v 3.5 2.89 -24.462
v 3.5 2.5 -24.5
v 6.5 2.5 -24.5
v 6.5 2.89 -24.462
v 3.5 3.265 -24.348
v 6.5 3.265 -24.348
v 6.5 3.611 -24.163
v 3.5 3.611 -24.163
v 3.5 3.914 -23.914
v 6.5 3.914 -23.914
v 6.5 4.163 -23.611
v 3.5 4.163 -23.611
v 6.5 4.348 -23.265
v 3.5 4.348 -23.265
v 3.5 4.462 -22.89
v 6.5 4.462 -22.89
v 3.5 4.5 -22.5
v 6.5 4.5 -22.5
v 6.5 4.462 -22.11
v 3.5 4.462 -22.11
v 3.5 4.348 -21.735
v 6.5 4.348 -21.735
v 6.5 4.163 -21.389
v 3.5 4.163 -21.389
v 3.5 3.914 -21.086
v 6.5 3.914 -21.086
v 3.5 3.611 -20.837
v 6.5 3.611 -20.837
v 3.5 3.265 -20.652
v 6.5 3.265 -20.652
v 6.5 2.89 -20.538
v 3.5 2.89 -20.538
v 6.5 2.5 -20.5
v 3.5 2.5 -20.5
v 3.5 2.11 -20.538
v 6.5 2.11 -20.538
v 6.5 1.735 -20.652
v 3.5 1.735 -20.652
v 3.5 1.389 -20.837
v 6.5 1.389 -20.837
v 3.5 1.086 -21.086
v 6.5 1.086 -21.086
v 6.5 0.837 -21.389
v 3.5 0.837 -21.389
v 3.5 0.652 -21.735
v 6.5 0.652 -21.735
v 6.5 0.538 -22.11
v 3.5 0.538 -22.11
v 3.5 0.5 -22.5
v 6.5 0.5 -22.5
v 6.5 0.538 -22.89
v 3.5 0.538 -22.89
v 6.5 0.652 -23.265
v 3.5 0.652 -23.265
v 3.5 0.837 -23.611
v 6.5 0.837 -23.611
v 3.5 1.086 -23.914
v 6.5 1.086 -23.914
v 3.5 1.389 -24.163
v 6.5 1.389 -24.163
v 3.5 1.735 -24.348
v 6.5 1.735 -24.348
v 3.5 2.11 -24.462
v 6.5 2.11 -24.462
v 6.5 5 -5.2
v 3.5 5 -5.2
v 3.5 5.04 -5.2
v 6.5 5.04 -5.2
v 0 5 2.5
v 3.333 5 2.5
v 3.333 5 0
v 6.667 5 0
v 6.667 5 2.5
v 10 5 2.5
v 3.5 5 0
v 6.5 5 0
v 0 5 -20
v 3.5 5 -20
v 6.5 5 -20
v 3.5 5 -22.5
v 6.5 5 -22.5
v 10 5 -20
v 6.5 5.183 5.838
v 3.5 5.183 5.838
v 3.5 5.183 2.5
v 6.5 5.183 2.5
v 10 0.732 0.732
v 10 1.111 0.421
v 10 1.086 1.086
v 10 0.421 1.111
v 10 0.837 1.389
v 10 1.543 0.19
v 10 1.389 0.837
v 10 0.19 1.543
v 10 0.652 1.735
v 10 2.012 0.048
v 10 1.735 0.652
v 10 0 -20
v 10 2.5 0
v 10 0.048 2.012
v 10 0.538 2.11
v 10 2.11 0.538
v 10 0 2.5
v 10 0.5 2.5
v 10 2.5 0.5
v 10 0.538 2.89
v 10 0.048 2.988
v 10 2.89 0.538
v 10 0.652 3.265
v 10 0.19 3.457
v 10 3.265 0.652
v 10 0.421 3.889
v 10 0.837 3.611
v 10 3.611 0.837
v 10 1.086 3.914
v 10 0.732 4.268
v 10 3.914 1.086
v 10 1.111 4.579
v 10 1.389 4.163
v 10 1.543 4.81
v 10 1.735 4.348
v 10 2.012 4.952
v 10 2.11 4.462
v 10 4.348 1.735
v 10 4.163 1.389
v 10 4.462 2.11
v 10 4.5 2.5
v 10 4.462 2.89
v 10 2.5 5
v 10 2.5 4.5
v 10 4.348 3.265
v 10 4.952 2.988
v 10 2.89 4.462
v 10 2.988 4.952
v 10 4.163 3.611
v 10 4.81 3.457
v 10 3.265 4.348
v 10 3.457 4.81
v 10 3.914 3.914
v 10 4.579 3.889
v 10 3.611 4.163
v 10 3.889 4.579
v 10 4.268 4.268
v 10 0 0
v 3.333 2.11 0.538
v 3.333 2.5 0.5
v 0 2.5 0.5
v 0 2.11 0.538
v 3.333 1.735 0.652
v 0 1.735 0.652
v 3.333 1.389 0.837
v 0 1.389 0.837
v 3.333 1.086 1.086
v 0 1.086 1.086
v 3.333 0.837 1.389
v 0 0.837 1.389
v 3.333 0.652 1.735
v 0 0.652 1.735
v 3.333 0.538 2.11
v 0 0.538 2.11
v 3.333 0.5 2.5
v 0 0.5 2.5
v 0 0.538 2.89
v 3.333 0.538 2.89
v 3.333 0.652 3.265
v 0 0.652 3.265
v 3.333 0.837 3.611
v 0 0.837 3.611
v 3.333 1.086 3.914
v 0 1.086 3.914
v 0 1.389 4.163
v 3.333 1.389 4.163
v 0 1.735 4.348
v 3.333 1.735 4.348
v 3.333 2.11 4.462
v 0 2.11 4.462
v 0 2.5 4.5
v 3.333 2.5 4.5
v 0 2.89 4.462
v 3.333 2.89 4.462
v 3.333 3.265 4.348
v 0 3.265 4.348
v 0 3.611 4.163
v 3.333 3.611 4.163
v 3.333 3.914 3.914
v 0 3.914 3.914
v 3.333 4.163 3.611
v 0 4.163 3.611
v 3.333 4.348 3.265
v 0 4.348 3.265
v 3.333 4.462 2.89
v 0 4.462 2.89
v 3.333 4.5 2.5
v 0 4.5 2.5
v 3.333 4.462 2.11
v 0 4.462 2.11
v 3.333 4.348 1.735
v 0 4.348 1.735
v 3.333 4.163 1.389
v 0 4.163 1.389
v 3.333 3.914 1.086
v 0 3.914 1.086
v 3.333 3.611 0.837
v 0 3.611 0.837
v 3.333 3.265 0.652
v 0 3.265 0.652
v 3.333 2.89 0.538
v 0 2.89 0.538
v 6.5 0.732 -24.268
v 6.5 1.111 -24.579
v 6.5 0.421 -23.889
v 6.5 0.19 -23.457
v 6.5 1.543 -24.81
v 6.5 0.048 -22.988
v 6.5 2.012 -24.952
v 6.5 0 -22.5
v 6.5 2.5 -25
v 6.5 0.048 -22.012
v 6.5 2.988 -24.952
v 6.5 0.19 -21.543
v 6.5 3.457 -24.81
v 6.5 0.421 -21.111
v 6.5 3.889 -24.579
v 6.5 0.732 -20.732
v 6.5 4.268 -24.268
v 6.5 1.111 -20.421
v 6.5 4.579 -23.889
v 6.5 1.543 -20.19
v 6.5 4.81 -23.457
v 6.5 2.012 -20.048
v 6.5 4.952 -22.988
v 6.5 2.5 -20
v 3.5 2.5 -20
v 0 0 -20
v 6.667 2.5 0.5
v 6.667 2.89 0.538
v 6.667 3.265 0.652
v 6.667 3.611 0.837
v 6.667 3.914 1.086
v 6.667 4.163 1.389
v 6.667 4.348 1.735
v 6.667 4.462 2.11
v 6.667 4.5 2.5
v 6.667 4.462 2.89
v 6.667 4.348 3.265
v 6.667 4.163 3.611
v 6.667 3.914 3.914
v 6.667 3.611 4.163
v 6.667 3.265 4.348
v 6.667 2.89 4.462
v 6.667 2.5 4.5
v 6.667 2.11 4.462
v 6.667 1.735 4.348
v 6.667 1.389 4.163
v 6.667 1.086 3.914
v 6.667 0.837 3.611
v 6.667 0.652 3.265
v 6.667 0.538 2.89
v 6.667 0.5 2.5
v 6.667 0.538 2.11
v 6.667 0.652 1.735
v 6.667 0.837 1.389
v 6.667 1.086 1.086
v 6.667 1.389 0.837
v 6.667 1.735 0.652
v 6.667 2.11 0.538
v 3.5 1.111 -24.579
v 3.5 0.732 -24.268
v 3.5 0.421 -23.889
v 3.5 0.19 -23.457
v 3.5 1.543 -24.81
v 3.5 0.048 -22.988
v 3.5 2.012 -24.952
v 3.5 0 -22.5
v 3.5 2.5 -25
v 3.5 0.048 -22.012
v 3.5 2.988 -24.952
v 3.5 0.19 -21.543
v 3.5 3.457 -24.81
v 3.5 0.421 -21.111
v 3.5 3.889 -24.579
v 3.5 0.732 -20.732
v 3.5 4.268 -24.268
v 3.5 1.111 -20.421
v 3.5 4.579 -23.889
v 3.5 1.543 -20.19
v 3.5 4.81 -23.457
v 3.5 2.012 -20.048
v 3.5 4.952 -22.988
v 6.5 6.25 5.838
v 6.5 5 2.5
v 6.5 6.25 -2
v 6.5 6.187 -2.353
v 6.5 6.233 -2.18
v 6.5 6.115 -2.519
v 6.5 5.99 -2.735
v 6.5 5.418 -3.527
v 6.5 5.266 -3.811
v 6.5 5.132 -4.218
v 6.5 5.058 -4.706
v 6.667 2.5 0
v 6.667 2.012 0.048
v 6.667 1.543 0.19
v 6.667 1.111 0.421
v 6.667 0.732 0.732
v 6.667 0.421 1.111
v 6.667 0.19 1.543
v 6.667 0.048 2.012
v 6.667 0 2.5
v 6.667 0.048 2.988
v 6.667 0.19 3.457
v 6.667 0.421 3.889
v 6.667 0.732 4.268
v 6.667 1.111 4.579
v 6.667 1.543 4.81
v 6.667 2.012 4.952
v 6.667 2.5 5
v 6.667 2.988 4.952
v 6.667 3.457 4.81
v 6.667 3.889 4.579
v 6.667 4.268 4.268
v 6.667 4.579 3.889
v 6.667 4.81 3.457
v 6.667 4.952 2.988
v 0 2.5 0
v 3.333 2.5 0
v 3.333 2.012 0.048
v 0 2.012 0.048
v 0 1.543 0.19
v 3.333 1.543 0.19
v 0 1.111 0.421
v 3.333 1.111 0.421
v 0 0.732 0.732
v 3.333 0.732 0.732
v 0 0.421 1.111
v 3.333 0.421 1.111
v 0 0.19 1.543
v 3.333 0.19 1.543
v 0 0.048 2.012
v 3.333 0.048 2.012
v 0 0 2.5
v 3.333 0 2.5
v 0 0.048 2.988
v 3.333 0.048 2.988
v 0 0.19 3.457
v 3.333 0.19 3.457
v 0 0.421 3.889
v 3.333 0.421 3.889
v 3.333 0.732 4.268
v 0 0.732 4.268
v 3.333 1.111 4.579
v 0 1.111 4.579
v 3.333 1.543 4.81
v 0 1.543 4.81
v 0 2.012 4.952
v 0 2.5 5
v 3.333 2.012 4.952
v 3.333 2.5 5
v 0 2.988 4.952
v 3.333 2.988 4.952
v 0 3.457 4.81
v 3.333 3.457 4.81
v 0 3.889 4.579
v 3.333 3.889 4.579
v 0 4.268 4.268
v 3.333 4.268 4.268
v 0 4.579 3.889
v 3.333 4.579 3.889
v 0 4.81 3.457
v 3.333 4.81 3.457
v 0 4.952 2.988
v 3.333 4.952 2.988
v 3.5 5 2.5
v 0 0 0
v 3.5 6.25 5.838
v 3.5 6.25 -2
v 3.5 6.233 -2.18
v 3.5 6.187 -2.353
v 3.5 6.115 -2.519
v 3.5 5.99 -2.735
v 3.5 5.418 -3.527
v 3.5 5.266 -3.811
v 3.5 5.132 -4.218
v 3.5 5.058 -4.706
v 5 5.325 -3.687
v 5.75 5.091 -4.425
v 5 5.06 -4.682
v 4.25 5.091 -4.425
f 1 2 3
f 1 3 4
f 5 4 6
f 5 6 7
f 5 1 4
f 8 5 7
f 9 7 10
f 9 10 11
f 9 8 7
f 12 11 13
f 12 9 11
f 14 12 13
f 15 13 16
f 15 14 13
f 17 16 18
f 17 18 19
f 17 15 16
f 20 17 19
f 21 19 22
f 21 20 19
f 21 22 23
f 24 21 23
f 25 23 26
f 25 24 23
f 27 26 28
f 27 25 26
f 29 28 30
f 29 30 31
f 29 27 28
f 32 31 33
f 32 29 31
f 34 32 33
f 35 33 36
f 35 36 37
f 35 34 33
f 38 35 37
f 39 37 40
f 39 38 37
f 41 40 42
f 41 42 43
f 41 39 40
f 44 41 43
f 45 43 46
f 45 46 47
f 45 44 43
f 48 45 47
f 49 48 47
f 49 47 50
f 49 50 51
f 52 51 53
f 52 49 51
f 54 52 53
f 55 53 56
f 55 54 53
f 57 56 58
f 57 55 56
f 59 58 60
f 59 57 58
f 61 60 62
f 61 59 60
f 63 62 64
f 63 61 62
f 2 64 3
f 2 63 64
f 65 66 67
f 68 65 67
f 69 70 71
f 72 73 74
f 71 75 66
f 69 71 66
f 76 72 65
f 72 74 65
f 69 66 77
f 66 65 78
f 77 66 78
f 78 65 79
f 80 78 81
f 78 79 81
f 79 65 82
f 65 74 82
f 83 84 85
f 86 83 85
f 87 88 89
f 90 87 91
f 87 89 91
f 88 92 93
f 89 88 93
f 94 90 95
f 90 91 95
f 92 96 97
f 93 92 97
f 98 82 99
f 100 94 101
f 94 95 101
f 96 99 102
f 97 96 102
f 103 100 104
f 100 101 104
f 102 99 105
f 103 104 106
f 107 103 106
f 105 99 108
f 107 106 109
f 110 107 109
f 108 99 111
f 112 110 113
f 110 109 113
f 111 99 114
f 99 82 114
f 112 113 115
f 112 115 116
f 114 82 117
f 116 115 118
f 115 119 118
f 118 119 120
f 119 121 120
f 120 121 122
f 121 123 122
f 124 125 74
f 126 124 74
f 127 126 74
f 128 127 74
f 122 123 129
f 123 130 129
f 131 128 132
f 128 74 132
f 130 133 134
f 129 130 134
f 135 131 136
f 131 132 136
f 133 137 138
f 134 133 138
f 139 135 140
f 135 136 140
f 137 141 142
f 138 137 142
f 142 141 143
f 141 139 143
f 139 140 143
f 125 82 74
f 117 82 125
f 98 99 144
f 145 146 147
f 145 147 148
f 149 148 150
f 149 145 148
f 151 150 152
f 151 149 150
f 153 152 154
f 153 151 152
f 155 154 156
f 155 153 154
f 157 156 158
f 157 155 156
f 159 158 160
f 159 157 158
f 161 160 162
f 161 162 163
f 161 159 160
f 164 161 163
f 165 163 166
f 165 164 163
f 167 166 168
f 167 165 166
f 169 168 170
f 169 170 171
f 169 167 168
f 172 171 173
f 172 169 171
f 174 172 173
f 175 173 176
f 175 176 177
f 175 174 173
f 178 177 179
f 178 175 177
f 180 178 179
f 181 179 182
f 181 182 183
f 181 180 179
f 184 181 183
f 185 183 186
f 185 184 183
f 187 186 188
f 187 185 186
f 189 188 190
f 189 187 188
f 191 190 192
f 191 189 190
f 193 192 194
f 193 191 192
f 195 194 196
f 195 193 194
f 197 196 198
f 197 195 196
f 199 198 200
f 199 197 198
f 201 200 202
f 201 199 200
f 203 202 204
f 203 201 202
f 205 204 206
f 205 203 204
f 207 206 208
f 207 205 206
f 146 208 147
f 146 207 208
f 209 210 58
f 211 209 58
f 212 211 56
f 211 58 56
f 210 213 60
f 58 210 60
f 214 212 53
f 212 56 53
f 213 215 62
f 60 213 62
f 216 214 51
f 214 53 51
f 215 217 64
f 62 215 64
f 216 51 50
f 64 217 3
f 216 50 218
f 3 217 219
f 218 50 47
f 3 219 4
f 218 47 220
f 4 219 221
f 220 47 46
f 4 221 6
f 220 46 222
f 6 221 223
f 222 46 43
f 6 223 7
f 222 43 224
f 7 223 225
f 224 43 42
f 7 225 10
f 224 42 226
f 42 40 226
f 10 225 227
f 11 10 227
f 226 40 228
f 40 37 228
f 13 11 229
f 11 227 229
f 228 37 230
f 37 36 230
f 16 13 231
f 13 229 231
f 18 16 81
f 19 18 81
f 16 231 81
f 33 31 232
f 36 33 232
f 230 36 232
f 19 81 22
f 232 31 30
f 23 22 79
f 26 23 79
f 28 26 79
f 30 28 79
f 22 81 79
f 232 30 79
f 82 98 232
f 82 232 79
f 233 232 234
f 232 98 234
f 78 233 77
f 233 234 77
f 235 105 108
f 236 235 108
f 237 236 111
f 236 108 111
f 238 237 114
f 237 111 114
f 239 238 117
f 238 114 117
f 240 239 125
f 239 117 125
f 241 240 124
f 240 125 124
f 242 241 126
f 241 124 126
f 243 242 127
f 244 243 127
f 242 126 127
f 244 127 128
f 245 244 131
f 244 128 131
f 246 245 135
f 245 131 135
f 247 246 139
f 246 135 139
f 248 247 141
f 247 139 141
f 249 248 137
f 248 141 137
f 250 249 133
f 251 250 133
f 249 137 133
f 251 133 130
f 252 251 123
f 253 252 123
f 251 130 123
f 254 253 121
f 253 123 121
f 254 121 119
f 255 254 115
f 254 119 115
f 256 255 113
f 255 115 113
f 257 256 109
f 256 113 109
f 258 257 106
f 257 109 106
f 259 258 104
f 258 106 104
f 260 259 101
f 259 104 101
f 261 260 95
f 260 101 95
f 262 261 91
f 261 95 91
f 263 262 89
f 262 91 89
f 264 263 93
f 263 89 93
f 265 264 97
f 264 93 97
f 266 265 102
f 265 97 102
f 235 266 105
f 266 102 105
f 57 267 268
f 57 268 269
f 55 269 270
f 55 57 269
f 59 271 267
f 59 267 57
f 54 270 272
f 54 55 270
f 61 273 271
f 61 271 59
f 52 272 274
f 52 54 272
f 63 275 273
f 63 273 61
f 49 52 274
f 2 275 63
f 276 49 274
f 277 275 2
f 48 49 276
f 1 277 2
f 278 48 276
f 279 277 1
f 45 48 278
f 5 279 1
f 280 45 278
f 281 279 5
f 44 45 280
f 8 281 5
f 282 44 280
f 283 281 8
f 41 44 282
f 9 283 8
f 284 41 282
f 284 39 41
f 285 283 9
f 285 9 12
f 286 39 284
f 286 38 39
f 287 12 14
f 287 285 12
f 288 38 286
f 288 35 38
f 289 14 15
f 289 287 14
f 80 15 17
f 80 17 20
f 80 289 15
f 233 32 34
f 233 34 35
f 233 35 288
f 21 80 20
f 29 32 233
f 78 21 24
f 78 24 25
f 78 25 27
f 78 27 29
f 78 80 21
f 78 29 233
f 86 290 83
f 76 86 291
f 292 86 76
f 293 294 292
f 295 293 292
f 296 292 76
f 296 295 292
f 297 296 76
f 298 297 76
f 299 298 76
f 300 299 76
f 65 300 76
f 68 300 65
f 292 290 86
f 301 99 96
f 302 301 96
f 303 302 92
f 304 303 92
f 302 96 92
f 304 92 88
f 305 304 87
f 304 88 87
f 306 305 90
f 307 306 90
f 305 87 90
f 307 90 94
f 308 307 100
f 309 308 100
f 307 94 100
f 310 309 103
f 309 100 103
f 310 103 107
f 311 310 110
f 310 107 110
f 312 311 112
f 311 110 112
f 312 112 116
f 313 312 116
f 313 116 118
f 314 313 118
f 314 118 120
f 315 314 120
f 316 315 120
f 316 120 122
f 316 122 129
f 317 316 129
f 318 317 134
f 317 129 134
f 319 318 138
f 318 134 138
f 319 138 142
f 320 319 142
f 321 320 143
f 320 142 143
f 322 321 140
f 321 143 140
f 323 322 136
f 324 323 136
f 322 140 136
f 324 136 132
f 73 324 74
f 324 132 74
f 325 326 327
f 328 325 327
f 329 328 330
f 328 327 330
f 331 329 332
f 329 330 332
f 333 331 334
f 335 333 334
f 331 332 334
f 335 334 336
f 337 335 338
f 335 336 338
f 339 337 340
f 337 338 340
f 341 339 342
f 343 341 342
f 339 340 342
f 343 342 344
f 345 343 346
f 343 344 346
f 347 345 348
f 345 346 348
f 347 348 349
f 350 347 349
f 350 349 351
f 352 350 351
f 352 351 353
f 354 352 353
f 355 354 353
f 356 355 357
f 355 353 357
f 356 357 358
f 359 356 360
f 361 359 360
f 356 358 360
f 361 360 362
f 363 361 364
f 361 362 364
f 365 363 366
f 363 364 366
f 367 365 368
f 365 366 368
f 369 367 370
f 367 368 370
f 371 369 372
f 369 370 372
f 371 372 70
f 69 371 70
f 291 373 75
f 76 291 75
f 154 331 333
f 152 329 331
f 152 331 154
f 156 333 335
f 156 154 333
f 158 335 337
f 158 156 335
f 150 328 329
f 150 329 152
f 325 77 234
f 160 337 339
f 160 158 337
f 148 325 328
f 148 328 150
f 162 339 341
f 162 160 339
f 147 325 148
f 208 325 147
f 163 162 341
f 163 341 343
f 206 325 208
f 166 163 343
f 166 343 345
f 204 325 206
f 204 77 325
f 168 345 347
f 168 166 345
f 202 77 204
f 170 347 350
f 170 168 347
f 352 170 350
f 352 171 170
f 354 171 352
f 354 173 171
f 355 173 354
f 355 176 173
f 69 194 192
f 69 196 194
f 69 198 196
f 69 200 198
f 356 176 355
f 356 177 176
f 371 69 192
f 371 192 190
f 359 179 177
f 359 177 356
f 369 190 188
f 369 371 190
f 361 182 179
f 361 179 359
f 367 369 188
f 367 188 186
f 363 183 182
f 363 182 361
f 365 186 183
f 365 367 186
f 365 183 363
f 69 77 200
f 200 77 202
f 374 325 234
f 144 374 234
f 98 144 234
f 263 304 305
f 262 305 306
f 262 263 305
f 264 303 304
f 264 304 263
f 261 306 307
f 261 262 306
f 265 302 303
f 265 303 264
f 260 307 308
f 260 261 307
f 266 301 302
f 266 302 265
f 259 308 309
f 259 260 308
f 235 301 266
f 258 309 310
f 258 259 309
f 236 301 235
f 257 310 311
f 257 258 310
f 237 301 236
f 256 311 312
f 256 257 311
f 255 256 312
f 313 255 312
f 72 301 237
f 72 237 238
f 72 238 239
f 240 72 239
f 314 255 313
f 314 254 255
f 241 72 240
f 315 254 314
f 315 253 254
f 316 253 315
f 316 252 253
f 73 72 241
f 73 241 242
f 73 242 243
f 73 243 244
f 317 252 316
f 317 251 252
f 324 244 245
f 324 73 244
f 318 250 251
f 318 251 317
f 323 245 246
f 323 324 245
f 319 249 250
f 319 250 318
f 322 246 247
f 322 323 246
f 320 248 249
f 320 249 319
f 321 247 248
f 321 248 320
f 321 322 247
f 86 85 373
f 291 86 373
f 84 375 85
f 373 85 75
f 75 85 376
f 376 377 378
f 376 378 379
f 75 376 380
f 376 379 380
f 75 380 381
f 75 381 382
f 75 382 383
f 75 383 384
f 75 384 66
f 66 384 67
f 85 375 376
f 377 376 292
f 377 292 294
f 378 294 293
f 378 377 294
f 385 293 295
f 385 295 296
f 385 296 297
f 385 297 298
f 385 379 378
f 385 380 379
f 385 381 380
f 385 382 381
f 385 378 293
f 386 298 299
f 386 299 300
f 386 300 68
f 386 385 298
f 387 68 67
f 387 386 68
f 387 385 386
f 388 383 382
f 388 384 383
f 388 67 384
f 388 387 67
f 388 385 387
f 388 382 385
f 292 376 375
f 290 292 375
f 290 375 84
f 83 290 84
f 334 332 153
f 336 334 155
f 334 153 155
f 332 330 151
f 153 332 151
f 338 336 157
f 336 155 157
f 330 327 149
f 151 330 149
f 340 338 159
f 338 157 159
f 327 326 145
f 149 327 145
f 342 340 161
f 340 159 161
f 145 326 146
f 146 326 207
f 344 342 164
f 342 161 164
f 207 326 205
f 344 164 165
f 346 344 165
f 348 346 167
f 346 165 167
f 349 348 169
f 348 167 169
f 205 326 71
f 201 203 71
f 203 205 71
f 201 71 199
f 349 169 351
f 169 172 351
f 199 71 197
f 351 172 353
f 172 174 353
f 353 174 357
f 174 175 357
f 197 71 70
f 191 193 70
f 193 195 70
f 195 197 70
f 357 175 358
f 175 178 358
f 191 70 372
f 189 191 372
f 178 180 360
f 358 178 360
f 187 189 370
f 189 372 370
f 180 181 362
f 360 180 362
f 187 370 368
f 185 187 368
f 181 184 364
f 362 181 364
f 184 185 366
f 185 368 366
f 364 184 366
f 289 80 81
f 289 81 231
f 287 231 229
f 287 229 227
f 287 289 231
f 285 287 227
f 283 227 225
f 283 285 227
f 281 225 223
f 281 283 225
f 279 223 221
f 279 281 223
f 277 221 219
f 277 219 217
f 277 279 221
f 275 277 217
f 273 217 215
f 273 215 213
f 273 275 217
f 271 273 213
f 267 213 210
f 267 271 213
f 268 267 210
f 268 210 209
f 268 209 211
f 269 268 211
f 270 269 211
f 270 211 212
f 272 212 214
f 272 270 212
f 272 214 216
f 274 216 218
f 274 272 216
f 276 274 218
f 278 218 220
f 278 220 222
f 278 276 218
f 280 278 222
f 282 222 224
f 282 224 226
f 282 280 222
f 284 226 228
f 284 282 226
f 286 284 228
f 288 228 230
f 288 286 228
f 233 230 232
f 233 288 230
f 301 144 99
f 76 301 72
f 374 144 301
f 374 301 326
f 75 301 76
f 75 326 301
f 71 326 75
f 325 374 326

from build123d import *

# Parameters (mm, degrees)
SKETCH2_W                = 20
SKETCH2_H                = 5
BOSS_EXTRUDE1_DEPTH      = 10
SKETCH4_R                = 2
BOSS_EXTRUDE2_DEPTH      = 3.333333333
BOSS_EXTRUDE3_START      = -3.333333333
SKETCH5_R                = 2
BOSS_EXTRUDE3_DEPTH      = 3.333333333
BOSS_EXTRUDE4_DEPTH      = 1.5
BOSS_EXTRUDE4_DEPTH_BACK = 1.5
SKETCH7_R                = 2
BOSS_EXTRUDE5_DEPTH      = 1.5
BOSS_EXTRUDE5_DEPTH_BACK = 1.5
CUT_EXTRUDE1_DEPTH       = 27.57654043


with BuildPart() as part:
    # Sketch2 → Boss-Extrude1 (new body)
    with BuildSketch(Plane(origin=(0, 0, 0), x_dir=(0, 0, -1), z_dir=(1, 0, 0))):
        with Locations((10, 2.5)):
            Rectangle(SKETCH2_W, SKETCH2_H)
    extrude(amount=BOSS_EXTRUDE1_DEPTH)

    # Sketch4 → Boss-Extrude2 (add)
    with BuildSketch(Plane(origin=(10, 0, 0), x_dir=(0, 0, -1), z_dir=(1, 0, 0))):
        with BuildLine():
            Line((-2.5, 5), (0, 5))
            Line((0, 5), (0, 2.5))
            ThreePointArc((0, 2.5), (-4.267766953, 0.732233047), (-2.5, 5))
        make_face()
        with Locations((-2.5, 2.5)):
            Circle(SKETCH4_R, mode=Mode.SUBTRACT)
    extrude(amount=-BOSS_EXTRUDE2_DEPTH)

    # Sketch5 → Boss-Extrude3 (add)
    with BuildSketch(Plane.ZY.offset(BOSS_EXTRUDE3_START)):
        with BuildLine():
            Line((2.5, 5), (0, 5))
            Line((0, 5), (0, 2.5))
            ThreePointArc((0, 2.5), (4.267766953, 0.732233047), (2.5, 5))
        make_face()
        with Locations(Location((2.5, 2.5, 0), (0, 0, 180))):
            Circle(SKETCH5_R, mode=Mode.SUBTRACT)
    extrude(amount=BOSS_EXTRUDE3_DEPTH)

    # Sketch7 → Boss-Extrude4 (add, two sides: drawn at the far end of the back side and taken through both)
    with BuildSketch(Plane(origin=(5, 0, 0), x_dir=(0, 0, -1), z_dir=(1, 0, 0)).offset(-BOSS_EXTRUDE4_DEPTH_BACK)):
        with BuildLine():
            Line((20, 5), (22.5, 5))
            ThreePointArc((22.5, 5), (24.267766953, 0.732233047), (20, 2.5))
            Line((20, 2.5), (20, 5))
        make_face()
        with Locations((22.5, 2.5)):
            Circle(SKETCH7_R, mode=Mode.SUBTRACT)
    extrude(amount=BOSS_EXTRUDE4_DEPTH + BOSS_EXTRUDE4_DEPTH_BACK)

    # Sketch8 → Boss-Extrude5 (add, two sides: drawn at the far end of the back side and taken through both)
    with BuildSketch(Plane(origin=(5, 0, 0), x_dir=(0, 0, -1), z_dir=(1, 0, 0)).offset(-BOSS_EXTRUDE5_DEPTH_BACK)):
        with BuildLine():
            Line((0, 5), (2, 5))
            Line((2, 5), (5.2, 5))
            Line((5.2, 5), (5.2, 5.04))
            add(Edge.make_bspline(
                [(2, 6.25), (2.633677282, 6.25), (3.485069852, 5.13334343), (4.685132782, 5.04), (5.2, 5.04)],
                knots=[0, 0, 0, 0, 0.555540961, 1, 1, 1, 1], degree=3))
            Line((2, 6.25), (-8, 6.25))
            Line((-8, 6.25), (-8, 5))
            Line((-8, 5), (0, 5))
        make_face()
    extrude(amount=BOSS_EXTRUDE5_DEPTH + BOSS_EXTRUDE5_DEPTH_BACK)

    # Sketch9 → Cut-Extrude1 (cut, through all)
    with BuildSketch(Plane.ZY.offset(-3.5)):
        Polygon((8, 6.25), (5.838024107, 6.25), (5.838024107, 5.183121739), (2.5, 5.183121739), (2.5, 5), (8, 5), align=None)
    extrude(amount=-CUT_EXTRUDE1_DEPTH, mode=Mode.SUBTRACT)


solid = part.part
